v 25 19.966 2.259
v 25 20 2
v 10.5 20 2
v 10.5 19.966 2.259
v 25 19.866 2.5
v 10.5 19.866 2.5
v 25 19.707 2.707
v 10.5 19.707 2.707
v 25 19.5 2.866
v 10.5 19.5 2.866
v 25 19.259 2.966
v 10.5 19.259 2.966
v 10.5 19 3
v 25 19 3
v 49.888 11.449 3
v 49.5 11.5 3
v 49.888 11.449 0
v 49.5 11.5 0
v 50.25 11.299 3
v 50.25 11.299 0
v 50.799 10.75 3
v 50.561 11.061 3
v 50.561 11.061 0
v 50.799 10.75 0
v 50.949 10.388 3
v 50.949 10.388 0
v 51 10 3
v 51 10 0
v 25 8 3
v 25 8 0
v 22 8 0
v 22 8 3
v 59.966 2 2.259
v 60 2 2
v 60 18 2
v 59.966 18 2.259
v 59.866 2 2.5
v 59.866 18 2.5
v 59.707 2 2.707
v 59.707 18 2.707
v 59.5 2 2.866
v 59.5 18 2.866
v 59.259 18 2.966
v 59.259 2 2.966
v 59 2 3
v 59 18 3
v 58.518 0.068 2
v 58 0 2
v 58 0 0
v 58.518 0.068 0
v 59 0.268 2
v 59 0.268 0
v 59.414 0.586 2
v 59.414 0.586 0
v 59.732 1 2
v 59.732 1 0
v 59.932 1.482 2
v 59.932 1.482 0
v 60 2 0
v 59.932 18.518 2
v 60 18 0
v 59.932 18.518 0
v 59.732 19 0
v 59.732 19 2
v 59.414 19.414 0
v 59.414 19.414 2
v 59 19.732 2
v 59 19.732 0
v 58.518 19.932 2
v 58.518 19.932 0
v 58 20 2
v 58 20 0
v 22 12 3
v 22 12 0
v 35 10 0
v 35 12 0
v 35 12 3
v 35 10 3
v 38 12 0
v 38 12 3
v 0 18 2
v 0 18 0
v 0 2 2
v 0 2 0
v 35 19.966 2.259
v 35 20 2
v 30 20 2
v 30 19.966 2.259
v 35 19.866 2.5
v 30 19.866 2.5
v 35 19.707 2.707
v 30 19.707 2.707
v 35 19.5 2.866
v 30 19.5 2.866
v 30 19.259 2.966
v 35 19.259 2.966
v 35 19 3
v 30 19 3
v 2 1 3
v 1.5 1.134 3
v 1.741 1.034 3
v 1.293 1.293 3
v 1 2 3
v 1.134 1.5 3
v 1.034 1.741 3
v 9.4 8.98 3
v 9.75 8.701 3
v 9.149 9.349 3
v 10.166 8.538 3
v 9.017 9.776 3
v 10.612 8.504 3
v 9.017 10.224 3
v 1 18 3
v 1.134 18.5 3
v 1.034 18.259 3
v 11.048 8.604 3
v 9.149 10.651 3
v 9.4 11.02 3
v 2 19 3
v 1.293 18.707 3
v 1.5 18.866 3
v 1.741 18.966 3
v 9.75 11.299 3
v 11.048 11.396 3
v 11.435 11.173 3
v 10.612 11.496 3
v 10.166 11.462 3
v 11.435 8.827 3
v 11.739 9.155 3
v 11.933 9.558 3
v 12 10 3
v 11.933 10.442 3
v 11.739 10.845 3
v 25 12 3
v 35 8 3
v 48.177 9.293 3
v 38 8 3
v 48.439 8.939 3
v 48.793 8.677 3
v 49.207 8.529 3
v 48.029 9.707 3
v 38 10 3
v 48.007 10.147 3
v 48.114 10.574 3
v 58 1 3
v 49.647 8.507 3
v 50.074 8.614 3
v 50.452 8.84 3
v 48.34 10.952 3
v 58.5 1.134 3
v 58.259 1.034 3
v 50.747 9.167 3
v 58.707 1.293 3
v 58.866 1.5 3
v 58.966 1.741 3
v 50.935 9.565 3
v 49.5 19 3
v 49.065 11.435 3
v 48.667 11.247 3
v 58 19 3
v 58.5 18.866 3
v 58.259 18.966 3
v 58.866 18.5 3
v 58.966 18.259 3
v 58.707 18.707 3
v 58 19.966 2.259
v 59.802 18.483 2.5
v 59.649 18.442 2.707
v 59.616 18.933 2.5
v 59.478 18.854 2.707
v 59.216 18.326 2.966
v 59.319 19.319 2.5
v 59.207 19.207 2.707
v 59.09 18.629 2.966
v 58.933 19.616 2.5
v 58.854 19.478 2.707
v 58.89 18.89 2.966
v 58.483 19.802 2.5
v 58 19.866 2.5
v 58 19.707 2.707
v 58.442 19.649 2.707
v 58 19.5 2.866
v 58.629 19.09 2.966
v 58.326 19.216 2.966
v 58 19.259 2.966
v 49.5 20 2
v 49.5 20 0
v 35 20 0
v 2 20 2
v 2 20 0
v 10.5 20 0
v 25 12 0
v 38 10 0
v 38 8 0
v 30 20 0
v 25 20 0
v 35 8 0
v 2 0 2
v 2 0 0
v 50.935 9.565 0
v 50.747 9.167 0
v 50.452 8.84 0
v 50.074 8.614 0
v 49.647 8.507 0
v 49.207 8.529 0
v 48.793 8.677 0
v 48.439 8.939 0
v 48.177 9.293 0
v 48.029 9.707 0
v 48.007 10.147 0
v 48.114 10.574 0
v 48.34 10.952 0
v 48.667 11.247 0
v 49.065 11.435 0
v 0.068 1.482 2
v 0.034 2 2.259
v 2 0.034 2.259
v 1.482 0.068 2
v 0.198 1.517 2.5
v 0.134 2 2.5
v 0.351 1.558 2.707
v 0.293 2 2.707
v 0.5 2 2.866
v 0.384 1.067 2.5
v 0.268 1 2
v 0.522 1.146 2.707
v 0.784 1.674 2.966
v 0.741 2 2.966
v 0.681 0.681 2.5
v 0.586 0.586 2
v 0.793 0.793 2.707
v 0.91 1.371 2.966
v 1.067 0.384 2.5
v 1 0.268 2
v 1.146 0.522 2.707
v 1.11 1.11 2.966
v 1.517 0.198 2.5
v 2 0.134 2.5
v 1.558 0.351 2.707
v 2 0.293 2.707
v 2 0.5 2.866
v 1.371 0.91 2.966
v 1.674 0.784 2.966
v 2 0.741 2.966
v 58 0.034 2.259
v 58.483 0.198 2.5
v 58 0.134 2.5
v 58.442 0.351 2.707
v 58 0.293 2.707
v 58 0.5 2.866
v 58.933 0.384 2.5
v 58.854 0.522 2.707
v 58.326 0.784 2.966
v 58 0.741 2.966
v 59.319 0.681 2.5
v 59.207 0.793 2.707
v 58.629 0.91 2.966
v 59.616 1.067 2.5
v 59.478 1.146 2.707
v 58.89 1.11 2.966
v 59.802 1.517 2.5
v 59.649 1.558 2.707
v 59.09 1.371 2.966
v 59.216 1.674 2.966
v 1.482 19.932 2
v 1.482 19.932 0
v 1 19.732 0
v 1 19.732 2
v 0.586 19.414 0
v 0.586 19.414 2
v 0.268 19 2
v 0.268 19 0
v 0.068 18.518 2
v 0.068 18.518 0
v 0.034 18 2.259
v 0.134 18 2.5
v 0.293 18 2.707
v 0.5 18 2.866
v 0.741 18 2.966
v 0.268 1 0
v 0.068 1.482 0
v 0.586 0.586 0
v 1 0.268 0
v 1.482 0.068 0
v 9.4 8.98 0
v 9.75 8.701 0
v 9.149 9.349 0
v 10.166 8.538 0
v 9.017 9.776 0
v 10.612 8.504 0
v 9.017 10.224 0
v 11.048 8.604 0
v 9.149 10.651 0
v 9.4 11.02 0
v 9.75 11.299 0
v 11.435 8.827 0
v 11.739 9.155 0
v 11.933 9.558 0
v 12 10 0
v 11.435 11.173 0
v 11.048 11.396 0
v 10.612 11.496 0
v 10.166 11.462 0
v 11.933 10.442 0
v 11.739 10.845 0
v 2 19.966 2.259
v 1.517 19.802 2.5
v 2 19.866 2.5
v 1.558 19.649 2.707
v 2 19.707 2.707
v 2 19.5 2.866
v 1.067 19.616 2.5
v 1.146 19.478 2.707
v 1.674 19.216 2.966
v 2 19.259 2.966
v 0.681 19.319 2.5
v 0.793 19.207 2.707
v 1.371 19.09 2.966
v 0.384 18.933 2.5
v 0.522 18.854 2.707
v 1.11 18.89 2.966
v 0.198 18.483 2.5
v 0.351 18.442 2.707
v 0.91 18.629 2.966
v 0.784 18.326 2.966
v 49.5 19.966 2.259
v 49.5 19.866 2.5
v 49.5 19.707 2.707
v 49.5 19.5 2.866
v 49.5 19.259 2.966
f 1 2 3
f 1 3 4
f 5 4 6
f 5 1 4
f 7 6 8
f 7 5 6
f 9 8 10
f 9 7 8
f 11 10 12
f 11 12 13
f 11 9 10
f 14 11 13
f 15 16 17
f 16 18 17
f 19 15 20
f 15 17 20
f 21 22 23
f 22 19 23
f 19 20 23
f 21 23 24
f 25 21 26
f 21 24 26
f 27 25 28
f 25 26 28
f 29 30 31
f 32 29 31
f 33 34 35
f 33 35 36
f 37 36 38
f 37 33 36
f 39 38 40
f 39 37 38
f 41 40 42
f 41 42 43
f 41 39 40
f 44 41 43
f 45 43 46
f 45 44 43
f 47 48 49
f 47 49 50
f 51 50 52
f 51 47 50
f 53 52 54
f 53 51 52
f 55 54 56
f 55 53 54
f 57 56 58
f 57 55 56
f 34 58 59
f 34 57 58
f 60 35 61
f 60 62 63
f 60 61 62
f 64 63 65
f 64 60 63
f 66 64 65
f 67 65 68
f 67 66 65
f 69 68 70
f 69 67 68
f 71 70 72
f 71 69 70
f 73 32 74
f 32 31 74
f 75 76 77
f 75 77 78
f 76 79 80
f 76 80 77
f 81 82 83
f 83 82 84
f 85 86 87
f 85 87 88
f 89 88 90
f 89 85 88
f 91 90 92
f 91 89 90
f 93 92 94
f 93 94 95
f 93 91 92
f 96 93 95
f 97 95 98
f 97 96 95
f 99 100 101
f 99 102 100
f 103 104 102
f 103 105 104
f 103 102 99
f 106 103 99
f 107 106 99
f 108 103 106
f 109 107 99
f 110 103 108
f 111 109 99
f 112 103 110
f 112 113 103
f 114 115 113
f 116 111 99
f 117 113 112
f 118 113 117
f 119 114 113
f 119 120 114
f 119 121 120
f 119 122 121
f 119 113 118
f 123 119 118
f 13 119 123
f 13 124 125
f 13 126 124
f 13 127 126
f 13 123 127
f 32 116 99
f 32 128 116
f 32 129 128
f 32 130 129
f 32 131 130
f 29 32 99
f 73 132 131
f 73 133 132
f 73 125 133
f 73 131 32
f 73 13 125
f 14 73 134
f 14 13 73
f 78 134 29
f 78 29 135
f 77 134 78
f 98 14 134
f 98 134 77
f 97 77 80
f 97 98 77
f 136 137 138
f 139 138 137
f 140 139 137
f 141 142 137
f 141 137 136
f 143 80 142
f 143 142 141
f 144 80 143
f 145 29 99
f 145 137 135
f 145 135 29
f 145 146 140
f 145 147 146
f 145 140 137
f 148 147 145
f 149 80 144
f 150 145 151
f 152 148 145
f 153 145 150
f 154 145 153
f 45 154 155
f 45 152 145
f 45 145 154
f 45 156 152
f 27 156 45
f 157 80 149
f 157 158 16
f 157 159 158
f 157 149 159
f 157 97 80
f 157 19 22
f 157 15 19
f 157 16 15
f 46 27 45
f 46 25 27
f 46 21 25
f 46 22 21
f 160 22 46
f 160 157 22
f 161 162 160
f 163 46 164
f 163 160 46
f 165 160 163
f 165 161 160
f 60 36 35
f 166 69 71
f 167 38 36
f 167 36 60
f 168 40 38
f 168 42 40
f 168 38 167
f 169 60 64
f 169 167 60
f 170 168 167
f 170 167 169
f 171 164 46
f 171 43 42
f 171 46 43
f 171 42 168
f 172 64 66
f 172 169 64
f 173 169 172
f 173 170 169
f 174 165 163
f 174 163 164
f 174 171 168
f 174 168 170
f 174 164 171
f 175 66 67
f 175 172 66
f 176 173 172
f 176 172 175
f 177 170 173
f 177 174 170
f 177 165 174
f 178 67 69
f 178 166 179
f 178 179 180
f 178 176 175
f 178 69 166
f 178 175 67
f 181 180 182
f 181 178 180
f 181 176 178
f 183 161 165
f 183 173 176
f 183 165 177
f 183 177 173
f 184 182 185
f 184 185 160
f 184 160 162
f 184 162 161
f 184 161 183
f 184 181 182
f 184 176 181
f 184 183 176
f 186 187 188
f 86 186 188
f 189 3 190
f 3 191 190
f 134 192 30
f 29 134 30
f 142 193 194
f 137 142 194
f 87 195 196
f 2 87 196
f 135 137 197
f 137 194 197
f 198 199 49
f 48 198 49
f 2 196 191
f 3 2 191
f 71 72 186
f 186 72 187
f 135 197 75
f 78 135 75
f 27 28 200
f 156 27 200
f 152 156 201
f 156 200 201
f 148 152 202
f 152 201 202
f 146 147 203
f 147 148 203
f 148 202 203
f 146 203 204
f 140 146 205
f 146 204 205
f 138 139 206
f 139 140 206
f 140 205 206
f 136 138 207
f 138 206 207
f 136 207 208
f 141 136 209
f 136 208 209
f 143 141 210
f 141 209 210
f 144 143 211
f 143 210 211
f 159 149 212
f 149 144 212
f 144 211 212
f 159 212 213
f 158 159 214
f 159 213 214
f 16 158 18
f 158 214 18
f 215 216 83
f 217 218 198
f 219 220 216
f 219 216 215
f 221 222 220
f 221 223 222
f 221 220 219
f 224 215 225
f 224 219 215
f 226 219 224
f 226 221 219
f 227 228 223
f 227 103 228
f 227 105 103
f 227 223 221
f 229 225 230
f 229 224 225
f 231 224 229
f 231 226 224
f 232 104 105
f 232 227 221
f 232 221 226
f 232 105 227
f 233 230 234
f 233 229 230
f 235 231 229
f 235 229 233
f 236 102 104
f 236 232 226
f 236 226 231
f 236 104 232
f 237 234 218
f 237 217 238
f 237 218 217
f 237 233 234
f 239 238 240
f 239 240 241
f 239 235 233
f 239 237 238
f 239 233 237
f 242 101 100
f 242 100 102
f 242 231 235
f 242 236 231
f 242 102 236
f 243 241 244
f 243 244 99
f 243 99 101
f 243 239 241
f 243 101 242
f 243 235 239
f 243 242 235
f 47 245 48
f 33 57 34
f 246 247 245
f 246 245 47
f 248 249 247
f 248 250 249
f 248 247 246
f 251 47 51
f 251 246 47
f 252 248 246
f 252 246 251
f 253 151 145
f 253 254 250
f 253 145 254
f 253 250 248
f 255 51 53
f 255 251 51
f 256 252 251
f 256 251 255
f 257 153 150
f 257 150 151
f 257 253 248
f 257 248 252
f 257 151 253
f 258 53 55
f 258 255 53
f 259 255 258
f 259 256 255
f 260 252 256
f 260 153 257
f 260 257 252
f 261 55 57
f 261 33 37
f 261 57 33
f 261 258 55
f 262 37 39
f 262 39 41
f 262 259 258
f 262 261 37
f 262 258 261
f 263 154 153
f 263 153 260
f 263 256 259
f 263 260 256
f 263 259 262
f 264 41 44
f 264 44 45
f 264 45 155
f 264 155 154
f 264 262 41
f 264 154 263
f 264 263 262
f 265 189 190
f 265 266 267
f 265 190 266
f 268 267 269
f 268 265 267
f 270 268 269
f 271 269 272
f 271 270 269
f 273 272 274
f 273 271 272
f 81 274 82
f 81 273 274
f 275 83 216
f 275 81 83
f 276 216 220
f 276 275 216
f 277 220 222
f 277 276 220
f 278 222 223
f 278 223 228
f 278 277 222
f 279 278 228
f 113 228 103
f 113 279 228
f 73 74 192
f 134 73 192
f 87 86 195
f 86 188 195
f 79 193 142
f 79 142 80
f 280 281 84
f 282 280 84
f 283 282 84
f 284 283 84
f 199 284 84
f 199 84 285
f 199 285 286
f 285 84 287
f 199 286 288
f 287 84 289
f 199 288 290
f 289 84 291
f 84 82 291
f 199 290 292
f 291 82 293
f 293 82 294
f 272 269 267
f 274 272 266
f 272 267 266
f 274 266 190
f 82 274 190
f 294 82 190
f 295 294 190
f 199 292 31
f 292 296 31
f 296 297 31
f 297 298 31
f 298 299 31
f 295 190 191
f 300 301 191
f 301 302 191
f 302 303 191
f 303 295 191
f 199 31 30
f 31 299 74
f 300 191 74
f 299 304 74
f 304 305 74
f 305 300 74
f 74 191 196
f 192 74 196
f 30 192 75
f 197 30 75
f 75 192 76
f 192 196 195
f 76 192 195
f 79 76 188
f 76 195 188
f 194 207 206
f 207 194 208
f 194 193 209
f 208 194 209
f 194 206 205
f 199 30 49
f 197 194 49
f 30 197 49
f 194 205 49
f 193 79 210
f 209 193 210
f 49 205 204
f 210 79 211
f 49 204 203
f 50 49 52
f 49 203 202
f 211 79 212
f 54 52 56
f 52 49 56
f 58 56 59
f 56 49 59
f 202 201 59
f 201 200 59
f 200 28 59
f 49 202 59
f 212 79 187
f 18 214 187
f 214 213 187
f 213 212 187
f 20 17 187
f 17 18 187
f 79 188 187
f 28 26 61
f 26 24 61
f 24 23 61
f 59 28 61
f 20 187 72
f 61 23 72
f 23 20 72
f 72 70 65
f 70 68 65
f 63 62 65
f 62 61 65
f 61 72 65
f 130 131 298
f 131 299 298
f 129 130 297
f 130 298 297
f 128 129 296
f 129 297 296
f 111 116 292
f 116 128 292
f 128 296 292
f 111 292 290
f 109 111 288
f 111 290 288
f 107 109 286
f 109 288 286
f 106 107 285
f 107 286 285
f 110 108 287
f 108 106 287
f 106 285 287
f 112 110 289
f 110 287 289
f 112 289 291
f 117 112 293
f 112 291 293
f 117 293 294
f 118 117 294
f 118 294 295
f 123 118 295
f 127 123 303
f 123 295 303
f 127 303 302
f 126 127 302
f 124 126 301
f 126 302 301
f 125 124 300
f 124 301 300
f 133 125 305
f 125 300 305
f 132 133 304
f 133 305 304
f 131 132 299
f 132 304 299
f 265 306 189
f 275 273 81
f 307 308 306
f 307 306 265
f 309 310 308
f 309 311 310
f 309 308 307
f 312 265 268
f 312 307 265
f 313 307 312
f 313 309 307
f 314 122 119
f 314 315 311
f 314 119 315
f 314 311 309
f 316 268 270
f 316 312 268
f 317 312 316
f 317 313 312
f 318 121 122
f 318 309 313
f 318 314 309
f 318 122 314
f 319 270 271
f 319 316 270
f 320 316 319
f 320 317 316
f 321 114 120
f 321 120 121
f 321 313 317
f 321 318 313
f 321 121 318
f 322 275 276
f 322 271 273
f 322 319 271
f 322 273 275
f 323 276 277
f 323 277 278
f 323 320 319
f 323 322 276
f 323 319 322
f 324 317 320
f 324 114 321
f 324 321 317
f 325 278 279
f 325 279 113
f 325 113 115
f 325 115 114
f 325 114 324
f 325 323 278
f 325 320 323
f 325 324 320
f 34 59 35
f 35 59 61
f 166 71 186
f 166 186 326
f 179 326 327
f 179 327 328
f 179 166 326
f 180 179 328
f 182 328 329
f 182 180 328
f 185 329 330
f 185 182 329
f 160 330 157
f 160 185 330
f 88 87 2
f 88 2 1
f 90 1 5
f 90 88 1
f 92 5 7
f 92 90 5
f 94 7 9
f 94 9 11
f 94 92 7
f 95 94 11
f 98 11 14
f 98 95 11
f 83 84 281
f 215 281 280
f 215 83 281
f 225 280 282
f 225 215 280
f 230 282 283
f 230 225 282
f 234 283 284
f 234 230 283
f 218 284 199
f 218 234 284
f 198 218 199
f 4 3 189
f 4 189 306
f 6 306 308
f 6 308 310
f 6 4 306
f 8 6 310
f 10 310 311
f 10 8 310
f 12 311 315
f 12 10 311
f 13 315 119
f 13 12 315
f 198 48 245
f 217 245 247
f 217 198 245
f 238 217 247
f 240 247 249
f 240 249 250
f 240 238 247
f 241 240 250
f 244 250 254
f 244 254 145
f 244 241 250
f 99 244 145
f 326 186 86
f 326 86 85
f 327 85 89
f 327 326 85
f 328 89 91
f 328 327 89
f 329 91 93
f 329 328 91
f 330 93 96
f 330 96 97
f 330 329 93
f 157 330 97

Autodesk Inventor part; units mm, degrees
ref_plane "YZ Plane" through (0, 0, 0) normal (1, 0, 0) x (0, 1, 0)
ref_plane "XZ Plane" through (0, 0, 0) normal (0, 1, 0) x (-1, 0, 0)
ref_plane "XY Plane" through (0, 0, 0) normal (0, 0, 1) x (1, 0, 0)
sketch "Boceto1" plane through (0, 0, 0) normal (0, 0, 1) x (1, 0, 0)
  line L0 (0, 0) -> (60, 0)
  line L1 (60, 0) -> (60, 20)
  line L2 (60, 20) -> (0, 20)
  line L3 (0, 20) -> (0, 0)
  line L4 (30, 20) -> (10.5, 20)
  line L5 (30, 20) -> (49.5, 20)
  line L6 (49.5, 20) -> (49.5, 10)
  circle A0 centre (10.5, 10) radius 1.5
  circle A1 centre (49.5, 10) radius 1.5
  line L7 (30, 20) -> (35, 20)
  line L8 (35, 20) -> (35, 10)
  line L9 (38, 10) -> (38, 12)
  line L10 (38, 10) -> (38, 8)
  line L11 (38, 8) -> (35, 8)
  line L12 (35, 8) -> (35, 10)
  line L13 (38, 12) -> (35, 12)
  line L14 (30, 20) -> (25, 20)
  line L15 (25, 20) -> (25, 12)
  line L16 (25, 12) -> (25, 8)
  line L17 (25, 8) -> (22, 8)
  line L18 (22, 8) -> (22, 12)
  line L19 (22, 12) -> (25, 12)
  dimension "d0" = 60
  dimension "d1" = 20
  dimension "d2" = 19.5
  dimension "d3" = 19.5
  dimension "d4" = 10
  dimension "d5" = 3
  dimension "d6" = 3
  dimension "d7" = 5
  dimension "d8" = 3
  dimension "d9" = 2
  dimension "d10" = 2
  dimension "d11" = 5
  dimension "d12" = 3
extrude "Extrusión1" add sketch "Boceto1" along normal blind 3
fillet "Empalme1" radius 2 4 edges at (60, 20, 1.5) (60, 0, 1.5) (0, 20, 1.5) (0, 0, 1.5)
fillet "Empalme2" radius 1 8 edges at (0.5858, 19.4142, 3) (0, 10, 3) (0.5858, 0.5858, 3) (30, 0, 3) (59.4142, 0.5858, 3) (60, 10, 3) (59.4142, 19.4142, 3) (42.25, 20, 3)
properties part number "tapa_soporte_bateria"
